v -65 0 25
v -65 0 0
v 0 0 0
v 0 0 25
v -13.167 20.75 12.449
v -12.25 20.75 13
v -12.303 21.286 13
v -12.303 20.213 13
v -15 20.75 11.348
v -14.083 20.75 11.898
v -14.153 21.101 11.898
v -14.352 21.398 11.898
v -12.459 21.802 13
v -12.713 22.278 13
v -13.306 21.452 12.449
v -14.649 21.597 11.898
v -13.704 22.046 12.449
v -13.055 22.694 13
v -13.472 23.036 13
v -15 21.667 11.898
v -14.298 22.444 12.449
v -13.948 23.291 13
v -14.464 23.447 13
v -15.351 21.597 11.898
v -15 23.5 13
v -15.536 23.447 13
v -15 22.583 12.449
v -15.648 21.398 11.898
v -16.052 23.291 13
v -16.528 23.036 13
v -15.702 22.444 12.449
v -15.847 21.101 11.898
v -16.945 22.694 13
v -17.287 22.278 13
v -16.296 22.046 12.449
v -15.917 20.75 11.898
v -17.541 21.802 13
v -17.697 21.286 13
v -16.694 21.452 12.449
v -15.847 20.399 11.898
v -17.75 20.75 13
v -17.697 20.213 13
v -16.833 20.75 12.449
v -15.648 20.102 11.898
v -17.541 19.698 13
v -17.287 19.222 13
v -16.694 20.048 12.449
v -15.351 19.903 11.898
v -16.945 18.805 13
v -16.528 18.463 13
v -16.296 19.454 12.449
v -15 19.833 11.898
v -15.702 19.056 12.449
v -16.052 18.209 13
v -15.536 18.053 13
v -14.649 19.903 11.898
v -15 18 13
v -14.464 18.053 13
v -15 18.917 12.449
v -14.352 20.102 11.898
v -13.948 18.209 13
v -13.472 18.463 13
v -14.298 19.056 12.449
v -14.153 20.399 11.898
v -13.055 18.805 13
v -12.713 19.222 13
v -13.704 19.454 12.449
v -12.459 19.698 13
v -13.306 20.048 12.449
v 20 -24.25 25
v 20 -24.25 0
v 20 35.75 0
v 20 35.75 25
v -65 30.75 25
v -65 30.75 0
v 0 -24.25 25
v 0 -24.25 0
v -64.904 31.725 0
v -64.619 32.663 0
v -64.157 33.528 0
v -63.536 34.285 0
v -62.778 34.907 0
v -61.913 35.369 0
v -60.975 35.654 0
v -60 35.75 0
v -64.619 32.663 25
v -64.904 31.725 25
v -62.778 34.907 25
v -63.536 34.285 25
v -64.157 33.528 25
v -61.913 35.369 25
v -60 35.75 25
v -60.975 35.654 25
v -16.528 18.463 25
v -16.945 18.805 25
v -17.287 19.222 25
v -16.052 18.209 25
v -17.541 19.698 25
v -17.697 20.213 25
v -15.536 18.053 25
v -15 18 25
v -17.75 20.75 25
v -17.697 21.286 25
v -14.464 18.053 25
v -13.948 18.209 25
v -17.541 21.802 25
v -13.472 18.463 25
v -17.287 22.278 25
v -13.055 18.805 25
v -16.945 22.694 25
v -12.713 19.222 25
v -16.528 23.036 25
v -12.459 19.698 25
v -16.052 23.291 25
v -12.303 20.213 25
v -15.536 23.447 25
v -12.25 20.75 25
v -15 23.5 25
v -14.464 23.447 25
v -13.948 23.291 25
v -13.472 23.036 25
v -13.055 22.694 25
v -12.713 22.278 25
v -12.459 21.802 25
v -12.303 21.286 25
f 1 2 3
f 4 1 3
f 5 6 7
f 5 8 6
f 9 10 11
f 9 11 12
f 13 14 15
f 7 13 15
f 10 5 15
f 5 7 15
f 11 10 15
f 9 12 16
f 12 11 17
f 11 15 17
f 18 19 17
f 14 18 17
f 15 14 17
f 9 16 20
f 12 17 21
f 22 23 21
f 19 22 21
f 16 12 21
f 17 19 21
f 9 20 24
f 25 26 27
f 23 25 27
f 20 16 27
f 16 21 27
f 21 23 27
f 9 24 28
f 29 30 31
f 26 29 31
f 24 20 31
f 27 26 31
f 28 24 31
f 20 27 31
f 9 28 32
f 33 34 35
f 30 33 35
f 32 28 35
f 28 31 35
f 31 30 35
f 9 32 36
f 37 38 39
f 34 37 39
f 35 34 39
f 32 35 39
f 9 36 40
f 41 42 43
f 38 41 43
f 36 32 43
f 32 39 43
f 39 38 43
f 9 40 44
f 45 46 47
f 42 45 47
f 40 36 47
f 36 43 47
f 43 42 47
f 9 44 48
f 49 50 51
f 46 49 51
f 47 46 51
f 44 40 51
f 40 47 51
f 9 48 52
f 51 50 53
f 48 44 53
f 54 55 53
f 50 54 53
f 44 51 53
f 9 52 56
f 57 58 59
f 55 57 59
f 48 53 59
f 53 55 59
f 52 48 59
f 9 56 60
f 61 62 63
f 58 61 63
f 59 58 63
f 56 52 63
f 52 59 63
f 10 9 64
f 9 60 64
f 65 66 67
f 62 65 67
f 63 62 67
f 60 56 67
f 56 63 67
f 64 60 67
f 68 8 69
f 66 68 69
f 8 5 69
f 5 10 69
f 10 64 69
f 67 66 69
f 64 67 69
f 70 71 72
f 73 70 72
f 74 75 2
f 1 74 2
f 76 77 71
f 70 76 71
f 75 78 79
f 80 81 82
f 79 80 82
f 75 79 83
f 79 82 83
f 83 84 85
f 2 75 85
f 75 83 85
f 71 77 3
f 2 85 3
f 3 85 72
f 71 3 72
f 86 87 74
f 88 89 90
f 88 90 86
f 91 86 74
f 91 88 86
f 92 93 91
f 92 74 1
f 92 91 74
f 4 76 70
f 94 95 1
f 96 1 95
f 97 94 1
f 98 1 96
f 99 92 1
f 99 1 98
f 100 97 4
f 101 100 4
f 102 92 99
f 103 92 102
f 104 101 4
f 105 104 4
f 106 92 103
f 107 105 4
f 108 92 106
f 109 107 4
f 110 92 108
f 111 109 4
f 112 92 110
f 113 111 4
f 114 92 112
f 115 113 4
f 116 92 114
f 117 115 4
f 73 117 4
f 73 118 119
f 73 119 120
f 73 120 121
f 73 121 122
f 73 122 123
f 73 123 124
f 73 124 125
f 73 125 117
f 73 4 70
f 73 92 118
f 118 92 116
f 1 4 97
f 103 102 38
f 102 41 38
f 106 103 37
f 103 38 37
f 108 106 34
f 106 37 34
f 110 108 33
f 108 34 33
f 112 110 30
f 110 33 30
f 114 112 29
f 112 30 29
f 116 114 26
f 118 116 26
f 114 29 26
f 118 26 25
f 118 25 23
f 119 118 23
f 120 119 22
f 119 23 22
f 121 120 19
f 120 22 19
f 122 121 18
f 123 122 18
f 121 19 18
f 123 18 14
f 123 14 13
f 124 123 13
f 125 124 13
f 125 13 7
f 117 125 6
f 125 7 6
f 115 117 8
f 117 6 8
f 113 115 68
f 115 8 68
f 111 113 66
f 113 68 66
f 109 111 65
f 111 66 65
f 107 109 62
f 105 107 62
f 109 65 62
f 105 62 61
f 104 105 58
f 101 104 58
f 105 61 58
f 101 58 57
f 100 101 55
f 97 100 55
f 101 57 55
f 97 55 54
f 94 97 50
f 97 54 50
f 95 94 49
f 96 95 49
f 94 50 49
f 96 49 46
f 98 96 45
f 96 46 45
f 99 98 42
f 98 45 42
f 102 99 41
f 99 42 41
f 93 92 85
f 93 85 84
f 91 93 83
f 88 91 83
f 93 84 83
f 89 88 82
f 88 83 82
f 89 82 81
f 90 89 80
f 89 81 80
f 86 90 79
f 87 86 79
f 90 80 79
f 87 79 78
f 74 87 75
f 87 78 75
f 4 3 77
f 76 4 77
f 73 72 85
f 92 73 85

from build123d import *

# Parameters (mm, degrees)
F1_DEPTH = 25
F3_D     = 5.5
F3_DEPTH = 12
F3_TIP   = 1.6523667023


with BuildPart() as f1:
    # F0 (on Top) → F1 (new body)
    with BuildSketch(Plane.XY):
        with BuildLine():
            Line((20, 35.7499521262), (-60, 35.7499521262))
            ThreePointArc((-60, 35.7499521262), (-63.5355339059, 34.2854860321), (-65, 30.7499521262))
            Line((-65, 30.7499521262), (-65, 0))
            Line((-65, 0), (0, 0))
            Line((0, 0), (0, -24.2500478738))
            Line((0, -24.2500478738), (20, -24.2500478738))
            Line((20, -24.2500478738), (20, 35.7499521262))
        make_face()
    extrude(amount=F1_DEPTH)

    # F3
    with Locations(Plane.XY.offset(25)):
        with Locations((-15, 20.7499521262)):
            Hole(F3_D / 2, depth=F3_DEPTH)
            with Locations((0, 0, -(F3_DEPTH + F3_TIP / 2))):  # 118° drill point
                Cone(0, F3_D / 2, F3_TIP, mode=Mode.SUBTRACT)


solid = f1.part
